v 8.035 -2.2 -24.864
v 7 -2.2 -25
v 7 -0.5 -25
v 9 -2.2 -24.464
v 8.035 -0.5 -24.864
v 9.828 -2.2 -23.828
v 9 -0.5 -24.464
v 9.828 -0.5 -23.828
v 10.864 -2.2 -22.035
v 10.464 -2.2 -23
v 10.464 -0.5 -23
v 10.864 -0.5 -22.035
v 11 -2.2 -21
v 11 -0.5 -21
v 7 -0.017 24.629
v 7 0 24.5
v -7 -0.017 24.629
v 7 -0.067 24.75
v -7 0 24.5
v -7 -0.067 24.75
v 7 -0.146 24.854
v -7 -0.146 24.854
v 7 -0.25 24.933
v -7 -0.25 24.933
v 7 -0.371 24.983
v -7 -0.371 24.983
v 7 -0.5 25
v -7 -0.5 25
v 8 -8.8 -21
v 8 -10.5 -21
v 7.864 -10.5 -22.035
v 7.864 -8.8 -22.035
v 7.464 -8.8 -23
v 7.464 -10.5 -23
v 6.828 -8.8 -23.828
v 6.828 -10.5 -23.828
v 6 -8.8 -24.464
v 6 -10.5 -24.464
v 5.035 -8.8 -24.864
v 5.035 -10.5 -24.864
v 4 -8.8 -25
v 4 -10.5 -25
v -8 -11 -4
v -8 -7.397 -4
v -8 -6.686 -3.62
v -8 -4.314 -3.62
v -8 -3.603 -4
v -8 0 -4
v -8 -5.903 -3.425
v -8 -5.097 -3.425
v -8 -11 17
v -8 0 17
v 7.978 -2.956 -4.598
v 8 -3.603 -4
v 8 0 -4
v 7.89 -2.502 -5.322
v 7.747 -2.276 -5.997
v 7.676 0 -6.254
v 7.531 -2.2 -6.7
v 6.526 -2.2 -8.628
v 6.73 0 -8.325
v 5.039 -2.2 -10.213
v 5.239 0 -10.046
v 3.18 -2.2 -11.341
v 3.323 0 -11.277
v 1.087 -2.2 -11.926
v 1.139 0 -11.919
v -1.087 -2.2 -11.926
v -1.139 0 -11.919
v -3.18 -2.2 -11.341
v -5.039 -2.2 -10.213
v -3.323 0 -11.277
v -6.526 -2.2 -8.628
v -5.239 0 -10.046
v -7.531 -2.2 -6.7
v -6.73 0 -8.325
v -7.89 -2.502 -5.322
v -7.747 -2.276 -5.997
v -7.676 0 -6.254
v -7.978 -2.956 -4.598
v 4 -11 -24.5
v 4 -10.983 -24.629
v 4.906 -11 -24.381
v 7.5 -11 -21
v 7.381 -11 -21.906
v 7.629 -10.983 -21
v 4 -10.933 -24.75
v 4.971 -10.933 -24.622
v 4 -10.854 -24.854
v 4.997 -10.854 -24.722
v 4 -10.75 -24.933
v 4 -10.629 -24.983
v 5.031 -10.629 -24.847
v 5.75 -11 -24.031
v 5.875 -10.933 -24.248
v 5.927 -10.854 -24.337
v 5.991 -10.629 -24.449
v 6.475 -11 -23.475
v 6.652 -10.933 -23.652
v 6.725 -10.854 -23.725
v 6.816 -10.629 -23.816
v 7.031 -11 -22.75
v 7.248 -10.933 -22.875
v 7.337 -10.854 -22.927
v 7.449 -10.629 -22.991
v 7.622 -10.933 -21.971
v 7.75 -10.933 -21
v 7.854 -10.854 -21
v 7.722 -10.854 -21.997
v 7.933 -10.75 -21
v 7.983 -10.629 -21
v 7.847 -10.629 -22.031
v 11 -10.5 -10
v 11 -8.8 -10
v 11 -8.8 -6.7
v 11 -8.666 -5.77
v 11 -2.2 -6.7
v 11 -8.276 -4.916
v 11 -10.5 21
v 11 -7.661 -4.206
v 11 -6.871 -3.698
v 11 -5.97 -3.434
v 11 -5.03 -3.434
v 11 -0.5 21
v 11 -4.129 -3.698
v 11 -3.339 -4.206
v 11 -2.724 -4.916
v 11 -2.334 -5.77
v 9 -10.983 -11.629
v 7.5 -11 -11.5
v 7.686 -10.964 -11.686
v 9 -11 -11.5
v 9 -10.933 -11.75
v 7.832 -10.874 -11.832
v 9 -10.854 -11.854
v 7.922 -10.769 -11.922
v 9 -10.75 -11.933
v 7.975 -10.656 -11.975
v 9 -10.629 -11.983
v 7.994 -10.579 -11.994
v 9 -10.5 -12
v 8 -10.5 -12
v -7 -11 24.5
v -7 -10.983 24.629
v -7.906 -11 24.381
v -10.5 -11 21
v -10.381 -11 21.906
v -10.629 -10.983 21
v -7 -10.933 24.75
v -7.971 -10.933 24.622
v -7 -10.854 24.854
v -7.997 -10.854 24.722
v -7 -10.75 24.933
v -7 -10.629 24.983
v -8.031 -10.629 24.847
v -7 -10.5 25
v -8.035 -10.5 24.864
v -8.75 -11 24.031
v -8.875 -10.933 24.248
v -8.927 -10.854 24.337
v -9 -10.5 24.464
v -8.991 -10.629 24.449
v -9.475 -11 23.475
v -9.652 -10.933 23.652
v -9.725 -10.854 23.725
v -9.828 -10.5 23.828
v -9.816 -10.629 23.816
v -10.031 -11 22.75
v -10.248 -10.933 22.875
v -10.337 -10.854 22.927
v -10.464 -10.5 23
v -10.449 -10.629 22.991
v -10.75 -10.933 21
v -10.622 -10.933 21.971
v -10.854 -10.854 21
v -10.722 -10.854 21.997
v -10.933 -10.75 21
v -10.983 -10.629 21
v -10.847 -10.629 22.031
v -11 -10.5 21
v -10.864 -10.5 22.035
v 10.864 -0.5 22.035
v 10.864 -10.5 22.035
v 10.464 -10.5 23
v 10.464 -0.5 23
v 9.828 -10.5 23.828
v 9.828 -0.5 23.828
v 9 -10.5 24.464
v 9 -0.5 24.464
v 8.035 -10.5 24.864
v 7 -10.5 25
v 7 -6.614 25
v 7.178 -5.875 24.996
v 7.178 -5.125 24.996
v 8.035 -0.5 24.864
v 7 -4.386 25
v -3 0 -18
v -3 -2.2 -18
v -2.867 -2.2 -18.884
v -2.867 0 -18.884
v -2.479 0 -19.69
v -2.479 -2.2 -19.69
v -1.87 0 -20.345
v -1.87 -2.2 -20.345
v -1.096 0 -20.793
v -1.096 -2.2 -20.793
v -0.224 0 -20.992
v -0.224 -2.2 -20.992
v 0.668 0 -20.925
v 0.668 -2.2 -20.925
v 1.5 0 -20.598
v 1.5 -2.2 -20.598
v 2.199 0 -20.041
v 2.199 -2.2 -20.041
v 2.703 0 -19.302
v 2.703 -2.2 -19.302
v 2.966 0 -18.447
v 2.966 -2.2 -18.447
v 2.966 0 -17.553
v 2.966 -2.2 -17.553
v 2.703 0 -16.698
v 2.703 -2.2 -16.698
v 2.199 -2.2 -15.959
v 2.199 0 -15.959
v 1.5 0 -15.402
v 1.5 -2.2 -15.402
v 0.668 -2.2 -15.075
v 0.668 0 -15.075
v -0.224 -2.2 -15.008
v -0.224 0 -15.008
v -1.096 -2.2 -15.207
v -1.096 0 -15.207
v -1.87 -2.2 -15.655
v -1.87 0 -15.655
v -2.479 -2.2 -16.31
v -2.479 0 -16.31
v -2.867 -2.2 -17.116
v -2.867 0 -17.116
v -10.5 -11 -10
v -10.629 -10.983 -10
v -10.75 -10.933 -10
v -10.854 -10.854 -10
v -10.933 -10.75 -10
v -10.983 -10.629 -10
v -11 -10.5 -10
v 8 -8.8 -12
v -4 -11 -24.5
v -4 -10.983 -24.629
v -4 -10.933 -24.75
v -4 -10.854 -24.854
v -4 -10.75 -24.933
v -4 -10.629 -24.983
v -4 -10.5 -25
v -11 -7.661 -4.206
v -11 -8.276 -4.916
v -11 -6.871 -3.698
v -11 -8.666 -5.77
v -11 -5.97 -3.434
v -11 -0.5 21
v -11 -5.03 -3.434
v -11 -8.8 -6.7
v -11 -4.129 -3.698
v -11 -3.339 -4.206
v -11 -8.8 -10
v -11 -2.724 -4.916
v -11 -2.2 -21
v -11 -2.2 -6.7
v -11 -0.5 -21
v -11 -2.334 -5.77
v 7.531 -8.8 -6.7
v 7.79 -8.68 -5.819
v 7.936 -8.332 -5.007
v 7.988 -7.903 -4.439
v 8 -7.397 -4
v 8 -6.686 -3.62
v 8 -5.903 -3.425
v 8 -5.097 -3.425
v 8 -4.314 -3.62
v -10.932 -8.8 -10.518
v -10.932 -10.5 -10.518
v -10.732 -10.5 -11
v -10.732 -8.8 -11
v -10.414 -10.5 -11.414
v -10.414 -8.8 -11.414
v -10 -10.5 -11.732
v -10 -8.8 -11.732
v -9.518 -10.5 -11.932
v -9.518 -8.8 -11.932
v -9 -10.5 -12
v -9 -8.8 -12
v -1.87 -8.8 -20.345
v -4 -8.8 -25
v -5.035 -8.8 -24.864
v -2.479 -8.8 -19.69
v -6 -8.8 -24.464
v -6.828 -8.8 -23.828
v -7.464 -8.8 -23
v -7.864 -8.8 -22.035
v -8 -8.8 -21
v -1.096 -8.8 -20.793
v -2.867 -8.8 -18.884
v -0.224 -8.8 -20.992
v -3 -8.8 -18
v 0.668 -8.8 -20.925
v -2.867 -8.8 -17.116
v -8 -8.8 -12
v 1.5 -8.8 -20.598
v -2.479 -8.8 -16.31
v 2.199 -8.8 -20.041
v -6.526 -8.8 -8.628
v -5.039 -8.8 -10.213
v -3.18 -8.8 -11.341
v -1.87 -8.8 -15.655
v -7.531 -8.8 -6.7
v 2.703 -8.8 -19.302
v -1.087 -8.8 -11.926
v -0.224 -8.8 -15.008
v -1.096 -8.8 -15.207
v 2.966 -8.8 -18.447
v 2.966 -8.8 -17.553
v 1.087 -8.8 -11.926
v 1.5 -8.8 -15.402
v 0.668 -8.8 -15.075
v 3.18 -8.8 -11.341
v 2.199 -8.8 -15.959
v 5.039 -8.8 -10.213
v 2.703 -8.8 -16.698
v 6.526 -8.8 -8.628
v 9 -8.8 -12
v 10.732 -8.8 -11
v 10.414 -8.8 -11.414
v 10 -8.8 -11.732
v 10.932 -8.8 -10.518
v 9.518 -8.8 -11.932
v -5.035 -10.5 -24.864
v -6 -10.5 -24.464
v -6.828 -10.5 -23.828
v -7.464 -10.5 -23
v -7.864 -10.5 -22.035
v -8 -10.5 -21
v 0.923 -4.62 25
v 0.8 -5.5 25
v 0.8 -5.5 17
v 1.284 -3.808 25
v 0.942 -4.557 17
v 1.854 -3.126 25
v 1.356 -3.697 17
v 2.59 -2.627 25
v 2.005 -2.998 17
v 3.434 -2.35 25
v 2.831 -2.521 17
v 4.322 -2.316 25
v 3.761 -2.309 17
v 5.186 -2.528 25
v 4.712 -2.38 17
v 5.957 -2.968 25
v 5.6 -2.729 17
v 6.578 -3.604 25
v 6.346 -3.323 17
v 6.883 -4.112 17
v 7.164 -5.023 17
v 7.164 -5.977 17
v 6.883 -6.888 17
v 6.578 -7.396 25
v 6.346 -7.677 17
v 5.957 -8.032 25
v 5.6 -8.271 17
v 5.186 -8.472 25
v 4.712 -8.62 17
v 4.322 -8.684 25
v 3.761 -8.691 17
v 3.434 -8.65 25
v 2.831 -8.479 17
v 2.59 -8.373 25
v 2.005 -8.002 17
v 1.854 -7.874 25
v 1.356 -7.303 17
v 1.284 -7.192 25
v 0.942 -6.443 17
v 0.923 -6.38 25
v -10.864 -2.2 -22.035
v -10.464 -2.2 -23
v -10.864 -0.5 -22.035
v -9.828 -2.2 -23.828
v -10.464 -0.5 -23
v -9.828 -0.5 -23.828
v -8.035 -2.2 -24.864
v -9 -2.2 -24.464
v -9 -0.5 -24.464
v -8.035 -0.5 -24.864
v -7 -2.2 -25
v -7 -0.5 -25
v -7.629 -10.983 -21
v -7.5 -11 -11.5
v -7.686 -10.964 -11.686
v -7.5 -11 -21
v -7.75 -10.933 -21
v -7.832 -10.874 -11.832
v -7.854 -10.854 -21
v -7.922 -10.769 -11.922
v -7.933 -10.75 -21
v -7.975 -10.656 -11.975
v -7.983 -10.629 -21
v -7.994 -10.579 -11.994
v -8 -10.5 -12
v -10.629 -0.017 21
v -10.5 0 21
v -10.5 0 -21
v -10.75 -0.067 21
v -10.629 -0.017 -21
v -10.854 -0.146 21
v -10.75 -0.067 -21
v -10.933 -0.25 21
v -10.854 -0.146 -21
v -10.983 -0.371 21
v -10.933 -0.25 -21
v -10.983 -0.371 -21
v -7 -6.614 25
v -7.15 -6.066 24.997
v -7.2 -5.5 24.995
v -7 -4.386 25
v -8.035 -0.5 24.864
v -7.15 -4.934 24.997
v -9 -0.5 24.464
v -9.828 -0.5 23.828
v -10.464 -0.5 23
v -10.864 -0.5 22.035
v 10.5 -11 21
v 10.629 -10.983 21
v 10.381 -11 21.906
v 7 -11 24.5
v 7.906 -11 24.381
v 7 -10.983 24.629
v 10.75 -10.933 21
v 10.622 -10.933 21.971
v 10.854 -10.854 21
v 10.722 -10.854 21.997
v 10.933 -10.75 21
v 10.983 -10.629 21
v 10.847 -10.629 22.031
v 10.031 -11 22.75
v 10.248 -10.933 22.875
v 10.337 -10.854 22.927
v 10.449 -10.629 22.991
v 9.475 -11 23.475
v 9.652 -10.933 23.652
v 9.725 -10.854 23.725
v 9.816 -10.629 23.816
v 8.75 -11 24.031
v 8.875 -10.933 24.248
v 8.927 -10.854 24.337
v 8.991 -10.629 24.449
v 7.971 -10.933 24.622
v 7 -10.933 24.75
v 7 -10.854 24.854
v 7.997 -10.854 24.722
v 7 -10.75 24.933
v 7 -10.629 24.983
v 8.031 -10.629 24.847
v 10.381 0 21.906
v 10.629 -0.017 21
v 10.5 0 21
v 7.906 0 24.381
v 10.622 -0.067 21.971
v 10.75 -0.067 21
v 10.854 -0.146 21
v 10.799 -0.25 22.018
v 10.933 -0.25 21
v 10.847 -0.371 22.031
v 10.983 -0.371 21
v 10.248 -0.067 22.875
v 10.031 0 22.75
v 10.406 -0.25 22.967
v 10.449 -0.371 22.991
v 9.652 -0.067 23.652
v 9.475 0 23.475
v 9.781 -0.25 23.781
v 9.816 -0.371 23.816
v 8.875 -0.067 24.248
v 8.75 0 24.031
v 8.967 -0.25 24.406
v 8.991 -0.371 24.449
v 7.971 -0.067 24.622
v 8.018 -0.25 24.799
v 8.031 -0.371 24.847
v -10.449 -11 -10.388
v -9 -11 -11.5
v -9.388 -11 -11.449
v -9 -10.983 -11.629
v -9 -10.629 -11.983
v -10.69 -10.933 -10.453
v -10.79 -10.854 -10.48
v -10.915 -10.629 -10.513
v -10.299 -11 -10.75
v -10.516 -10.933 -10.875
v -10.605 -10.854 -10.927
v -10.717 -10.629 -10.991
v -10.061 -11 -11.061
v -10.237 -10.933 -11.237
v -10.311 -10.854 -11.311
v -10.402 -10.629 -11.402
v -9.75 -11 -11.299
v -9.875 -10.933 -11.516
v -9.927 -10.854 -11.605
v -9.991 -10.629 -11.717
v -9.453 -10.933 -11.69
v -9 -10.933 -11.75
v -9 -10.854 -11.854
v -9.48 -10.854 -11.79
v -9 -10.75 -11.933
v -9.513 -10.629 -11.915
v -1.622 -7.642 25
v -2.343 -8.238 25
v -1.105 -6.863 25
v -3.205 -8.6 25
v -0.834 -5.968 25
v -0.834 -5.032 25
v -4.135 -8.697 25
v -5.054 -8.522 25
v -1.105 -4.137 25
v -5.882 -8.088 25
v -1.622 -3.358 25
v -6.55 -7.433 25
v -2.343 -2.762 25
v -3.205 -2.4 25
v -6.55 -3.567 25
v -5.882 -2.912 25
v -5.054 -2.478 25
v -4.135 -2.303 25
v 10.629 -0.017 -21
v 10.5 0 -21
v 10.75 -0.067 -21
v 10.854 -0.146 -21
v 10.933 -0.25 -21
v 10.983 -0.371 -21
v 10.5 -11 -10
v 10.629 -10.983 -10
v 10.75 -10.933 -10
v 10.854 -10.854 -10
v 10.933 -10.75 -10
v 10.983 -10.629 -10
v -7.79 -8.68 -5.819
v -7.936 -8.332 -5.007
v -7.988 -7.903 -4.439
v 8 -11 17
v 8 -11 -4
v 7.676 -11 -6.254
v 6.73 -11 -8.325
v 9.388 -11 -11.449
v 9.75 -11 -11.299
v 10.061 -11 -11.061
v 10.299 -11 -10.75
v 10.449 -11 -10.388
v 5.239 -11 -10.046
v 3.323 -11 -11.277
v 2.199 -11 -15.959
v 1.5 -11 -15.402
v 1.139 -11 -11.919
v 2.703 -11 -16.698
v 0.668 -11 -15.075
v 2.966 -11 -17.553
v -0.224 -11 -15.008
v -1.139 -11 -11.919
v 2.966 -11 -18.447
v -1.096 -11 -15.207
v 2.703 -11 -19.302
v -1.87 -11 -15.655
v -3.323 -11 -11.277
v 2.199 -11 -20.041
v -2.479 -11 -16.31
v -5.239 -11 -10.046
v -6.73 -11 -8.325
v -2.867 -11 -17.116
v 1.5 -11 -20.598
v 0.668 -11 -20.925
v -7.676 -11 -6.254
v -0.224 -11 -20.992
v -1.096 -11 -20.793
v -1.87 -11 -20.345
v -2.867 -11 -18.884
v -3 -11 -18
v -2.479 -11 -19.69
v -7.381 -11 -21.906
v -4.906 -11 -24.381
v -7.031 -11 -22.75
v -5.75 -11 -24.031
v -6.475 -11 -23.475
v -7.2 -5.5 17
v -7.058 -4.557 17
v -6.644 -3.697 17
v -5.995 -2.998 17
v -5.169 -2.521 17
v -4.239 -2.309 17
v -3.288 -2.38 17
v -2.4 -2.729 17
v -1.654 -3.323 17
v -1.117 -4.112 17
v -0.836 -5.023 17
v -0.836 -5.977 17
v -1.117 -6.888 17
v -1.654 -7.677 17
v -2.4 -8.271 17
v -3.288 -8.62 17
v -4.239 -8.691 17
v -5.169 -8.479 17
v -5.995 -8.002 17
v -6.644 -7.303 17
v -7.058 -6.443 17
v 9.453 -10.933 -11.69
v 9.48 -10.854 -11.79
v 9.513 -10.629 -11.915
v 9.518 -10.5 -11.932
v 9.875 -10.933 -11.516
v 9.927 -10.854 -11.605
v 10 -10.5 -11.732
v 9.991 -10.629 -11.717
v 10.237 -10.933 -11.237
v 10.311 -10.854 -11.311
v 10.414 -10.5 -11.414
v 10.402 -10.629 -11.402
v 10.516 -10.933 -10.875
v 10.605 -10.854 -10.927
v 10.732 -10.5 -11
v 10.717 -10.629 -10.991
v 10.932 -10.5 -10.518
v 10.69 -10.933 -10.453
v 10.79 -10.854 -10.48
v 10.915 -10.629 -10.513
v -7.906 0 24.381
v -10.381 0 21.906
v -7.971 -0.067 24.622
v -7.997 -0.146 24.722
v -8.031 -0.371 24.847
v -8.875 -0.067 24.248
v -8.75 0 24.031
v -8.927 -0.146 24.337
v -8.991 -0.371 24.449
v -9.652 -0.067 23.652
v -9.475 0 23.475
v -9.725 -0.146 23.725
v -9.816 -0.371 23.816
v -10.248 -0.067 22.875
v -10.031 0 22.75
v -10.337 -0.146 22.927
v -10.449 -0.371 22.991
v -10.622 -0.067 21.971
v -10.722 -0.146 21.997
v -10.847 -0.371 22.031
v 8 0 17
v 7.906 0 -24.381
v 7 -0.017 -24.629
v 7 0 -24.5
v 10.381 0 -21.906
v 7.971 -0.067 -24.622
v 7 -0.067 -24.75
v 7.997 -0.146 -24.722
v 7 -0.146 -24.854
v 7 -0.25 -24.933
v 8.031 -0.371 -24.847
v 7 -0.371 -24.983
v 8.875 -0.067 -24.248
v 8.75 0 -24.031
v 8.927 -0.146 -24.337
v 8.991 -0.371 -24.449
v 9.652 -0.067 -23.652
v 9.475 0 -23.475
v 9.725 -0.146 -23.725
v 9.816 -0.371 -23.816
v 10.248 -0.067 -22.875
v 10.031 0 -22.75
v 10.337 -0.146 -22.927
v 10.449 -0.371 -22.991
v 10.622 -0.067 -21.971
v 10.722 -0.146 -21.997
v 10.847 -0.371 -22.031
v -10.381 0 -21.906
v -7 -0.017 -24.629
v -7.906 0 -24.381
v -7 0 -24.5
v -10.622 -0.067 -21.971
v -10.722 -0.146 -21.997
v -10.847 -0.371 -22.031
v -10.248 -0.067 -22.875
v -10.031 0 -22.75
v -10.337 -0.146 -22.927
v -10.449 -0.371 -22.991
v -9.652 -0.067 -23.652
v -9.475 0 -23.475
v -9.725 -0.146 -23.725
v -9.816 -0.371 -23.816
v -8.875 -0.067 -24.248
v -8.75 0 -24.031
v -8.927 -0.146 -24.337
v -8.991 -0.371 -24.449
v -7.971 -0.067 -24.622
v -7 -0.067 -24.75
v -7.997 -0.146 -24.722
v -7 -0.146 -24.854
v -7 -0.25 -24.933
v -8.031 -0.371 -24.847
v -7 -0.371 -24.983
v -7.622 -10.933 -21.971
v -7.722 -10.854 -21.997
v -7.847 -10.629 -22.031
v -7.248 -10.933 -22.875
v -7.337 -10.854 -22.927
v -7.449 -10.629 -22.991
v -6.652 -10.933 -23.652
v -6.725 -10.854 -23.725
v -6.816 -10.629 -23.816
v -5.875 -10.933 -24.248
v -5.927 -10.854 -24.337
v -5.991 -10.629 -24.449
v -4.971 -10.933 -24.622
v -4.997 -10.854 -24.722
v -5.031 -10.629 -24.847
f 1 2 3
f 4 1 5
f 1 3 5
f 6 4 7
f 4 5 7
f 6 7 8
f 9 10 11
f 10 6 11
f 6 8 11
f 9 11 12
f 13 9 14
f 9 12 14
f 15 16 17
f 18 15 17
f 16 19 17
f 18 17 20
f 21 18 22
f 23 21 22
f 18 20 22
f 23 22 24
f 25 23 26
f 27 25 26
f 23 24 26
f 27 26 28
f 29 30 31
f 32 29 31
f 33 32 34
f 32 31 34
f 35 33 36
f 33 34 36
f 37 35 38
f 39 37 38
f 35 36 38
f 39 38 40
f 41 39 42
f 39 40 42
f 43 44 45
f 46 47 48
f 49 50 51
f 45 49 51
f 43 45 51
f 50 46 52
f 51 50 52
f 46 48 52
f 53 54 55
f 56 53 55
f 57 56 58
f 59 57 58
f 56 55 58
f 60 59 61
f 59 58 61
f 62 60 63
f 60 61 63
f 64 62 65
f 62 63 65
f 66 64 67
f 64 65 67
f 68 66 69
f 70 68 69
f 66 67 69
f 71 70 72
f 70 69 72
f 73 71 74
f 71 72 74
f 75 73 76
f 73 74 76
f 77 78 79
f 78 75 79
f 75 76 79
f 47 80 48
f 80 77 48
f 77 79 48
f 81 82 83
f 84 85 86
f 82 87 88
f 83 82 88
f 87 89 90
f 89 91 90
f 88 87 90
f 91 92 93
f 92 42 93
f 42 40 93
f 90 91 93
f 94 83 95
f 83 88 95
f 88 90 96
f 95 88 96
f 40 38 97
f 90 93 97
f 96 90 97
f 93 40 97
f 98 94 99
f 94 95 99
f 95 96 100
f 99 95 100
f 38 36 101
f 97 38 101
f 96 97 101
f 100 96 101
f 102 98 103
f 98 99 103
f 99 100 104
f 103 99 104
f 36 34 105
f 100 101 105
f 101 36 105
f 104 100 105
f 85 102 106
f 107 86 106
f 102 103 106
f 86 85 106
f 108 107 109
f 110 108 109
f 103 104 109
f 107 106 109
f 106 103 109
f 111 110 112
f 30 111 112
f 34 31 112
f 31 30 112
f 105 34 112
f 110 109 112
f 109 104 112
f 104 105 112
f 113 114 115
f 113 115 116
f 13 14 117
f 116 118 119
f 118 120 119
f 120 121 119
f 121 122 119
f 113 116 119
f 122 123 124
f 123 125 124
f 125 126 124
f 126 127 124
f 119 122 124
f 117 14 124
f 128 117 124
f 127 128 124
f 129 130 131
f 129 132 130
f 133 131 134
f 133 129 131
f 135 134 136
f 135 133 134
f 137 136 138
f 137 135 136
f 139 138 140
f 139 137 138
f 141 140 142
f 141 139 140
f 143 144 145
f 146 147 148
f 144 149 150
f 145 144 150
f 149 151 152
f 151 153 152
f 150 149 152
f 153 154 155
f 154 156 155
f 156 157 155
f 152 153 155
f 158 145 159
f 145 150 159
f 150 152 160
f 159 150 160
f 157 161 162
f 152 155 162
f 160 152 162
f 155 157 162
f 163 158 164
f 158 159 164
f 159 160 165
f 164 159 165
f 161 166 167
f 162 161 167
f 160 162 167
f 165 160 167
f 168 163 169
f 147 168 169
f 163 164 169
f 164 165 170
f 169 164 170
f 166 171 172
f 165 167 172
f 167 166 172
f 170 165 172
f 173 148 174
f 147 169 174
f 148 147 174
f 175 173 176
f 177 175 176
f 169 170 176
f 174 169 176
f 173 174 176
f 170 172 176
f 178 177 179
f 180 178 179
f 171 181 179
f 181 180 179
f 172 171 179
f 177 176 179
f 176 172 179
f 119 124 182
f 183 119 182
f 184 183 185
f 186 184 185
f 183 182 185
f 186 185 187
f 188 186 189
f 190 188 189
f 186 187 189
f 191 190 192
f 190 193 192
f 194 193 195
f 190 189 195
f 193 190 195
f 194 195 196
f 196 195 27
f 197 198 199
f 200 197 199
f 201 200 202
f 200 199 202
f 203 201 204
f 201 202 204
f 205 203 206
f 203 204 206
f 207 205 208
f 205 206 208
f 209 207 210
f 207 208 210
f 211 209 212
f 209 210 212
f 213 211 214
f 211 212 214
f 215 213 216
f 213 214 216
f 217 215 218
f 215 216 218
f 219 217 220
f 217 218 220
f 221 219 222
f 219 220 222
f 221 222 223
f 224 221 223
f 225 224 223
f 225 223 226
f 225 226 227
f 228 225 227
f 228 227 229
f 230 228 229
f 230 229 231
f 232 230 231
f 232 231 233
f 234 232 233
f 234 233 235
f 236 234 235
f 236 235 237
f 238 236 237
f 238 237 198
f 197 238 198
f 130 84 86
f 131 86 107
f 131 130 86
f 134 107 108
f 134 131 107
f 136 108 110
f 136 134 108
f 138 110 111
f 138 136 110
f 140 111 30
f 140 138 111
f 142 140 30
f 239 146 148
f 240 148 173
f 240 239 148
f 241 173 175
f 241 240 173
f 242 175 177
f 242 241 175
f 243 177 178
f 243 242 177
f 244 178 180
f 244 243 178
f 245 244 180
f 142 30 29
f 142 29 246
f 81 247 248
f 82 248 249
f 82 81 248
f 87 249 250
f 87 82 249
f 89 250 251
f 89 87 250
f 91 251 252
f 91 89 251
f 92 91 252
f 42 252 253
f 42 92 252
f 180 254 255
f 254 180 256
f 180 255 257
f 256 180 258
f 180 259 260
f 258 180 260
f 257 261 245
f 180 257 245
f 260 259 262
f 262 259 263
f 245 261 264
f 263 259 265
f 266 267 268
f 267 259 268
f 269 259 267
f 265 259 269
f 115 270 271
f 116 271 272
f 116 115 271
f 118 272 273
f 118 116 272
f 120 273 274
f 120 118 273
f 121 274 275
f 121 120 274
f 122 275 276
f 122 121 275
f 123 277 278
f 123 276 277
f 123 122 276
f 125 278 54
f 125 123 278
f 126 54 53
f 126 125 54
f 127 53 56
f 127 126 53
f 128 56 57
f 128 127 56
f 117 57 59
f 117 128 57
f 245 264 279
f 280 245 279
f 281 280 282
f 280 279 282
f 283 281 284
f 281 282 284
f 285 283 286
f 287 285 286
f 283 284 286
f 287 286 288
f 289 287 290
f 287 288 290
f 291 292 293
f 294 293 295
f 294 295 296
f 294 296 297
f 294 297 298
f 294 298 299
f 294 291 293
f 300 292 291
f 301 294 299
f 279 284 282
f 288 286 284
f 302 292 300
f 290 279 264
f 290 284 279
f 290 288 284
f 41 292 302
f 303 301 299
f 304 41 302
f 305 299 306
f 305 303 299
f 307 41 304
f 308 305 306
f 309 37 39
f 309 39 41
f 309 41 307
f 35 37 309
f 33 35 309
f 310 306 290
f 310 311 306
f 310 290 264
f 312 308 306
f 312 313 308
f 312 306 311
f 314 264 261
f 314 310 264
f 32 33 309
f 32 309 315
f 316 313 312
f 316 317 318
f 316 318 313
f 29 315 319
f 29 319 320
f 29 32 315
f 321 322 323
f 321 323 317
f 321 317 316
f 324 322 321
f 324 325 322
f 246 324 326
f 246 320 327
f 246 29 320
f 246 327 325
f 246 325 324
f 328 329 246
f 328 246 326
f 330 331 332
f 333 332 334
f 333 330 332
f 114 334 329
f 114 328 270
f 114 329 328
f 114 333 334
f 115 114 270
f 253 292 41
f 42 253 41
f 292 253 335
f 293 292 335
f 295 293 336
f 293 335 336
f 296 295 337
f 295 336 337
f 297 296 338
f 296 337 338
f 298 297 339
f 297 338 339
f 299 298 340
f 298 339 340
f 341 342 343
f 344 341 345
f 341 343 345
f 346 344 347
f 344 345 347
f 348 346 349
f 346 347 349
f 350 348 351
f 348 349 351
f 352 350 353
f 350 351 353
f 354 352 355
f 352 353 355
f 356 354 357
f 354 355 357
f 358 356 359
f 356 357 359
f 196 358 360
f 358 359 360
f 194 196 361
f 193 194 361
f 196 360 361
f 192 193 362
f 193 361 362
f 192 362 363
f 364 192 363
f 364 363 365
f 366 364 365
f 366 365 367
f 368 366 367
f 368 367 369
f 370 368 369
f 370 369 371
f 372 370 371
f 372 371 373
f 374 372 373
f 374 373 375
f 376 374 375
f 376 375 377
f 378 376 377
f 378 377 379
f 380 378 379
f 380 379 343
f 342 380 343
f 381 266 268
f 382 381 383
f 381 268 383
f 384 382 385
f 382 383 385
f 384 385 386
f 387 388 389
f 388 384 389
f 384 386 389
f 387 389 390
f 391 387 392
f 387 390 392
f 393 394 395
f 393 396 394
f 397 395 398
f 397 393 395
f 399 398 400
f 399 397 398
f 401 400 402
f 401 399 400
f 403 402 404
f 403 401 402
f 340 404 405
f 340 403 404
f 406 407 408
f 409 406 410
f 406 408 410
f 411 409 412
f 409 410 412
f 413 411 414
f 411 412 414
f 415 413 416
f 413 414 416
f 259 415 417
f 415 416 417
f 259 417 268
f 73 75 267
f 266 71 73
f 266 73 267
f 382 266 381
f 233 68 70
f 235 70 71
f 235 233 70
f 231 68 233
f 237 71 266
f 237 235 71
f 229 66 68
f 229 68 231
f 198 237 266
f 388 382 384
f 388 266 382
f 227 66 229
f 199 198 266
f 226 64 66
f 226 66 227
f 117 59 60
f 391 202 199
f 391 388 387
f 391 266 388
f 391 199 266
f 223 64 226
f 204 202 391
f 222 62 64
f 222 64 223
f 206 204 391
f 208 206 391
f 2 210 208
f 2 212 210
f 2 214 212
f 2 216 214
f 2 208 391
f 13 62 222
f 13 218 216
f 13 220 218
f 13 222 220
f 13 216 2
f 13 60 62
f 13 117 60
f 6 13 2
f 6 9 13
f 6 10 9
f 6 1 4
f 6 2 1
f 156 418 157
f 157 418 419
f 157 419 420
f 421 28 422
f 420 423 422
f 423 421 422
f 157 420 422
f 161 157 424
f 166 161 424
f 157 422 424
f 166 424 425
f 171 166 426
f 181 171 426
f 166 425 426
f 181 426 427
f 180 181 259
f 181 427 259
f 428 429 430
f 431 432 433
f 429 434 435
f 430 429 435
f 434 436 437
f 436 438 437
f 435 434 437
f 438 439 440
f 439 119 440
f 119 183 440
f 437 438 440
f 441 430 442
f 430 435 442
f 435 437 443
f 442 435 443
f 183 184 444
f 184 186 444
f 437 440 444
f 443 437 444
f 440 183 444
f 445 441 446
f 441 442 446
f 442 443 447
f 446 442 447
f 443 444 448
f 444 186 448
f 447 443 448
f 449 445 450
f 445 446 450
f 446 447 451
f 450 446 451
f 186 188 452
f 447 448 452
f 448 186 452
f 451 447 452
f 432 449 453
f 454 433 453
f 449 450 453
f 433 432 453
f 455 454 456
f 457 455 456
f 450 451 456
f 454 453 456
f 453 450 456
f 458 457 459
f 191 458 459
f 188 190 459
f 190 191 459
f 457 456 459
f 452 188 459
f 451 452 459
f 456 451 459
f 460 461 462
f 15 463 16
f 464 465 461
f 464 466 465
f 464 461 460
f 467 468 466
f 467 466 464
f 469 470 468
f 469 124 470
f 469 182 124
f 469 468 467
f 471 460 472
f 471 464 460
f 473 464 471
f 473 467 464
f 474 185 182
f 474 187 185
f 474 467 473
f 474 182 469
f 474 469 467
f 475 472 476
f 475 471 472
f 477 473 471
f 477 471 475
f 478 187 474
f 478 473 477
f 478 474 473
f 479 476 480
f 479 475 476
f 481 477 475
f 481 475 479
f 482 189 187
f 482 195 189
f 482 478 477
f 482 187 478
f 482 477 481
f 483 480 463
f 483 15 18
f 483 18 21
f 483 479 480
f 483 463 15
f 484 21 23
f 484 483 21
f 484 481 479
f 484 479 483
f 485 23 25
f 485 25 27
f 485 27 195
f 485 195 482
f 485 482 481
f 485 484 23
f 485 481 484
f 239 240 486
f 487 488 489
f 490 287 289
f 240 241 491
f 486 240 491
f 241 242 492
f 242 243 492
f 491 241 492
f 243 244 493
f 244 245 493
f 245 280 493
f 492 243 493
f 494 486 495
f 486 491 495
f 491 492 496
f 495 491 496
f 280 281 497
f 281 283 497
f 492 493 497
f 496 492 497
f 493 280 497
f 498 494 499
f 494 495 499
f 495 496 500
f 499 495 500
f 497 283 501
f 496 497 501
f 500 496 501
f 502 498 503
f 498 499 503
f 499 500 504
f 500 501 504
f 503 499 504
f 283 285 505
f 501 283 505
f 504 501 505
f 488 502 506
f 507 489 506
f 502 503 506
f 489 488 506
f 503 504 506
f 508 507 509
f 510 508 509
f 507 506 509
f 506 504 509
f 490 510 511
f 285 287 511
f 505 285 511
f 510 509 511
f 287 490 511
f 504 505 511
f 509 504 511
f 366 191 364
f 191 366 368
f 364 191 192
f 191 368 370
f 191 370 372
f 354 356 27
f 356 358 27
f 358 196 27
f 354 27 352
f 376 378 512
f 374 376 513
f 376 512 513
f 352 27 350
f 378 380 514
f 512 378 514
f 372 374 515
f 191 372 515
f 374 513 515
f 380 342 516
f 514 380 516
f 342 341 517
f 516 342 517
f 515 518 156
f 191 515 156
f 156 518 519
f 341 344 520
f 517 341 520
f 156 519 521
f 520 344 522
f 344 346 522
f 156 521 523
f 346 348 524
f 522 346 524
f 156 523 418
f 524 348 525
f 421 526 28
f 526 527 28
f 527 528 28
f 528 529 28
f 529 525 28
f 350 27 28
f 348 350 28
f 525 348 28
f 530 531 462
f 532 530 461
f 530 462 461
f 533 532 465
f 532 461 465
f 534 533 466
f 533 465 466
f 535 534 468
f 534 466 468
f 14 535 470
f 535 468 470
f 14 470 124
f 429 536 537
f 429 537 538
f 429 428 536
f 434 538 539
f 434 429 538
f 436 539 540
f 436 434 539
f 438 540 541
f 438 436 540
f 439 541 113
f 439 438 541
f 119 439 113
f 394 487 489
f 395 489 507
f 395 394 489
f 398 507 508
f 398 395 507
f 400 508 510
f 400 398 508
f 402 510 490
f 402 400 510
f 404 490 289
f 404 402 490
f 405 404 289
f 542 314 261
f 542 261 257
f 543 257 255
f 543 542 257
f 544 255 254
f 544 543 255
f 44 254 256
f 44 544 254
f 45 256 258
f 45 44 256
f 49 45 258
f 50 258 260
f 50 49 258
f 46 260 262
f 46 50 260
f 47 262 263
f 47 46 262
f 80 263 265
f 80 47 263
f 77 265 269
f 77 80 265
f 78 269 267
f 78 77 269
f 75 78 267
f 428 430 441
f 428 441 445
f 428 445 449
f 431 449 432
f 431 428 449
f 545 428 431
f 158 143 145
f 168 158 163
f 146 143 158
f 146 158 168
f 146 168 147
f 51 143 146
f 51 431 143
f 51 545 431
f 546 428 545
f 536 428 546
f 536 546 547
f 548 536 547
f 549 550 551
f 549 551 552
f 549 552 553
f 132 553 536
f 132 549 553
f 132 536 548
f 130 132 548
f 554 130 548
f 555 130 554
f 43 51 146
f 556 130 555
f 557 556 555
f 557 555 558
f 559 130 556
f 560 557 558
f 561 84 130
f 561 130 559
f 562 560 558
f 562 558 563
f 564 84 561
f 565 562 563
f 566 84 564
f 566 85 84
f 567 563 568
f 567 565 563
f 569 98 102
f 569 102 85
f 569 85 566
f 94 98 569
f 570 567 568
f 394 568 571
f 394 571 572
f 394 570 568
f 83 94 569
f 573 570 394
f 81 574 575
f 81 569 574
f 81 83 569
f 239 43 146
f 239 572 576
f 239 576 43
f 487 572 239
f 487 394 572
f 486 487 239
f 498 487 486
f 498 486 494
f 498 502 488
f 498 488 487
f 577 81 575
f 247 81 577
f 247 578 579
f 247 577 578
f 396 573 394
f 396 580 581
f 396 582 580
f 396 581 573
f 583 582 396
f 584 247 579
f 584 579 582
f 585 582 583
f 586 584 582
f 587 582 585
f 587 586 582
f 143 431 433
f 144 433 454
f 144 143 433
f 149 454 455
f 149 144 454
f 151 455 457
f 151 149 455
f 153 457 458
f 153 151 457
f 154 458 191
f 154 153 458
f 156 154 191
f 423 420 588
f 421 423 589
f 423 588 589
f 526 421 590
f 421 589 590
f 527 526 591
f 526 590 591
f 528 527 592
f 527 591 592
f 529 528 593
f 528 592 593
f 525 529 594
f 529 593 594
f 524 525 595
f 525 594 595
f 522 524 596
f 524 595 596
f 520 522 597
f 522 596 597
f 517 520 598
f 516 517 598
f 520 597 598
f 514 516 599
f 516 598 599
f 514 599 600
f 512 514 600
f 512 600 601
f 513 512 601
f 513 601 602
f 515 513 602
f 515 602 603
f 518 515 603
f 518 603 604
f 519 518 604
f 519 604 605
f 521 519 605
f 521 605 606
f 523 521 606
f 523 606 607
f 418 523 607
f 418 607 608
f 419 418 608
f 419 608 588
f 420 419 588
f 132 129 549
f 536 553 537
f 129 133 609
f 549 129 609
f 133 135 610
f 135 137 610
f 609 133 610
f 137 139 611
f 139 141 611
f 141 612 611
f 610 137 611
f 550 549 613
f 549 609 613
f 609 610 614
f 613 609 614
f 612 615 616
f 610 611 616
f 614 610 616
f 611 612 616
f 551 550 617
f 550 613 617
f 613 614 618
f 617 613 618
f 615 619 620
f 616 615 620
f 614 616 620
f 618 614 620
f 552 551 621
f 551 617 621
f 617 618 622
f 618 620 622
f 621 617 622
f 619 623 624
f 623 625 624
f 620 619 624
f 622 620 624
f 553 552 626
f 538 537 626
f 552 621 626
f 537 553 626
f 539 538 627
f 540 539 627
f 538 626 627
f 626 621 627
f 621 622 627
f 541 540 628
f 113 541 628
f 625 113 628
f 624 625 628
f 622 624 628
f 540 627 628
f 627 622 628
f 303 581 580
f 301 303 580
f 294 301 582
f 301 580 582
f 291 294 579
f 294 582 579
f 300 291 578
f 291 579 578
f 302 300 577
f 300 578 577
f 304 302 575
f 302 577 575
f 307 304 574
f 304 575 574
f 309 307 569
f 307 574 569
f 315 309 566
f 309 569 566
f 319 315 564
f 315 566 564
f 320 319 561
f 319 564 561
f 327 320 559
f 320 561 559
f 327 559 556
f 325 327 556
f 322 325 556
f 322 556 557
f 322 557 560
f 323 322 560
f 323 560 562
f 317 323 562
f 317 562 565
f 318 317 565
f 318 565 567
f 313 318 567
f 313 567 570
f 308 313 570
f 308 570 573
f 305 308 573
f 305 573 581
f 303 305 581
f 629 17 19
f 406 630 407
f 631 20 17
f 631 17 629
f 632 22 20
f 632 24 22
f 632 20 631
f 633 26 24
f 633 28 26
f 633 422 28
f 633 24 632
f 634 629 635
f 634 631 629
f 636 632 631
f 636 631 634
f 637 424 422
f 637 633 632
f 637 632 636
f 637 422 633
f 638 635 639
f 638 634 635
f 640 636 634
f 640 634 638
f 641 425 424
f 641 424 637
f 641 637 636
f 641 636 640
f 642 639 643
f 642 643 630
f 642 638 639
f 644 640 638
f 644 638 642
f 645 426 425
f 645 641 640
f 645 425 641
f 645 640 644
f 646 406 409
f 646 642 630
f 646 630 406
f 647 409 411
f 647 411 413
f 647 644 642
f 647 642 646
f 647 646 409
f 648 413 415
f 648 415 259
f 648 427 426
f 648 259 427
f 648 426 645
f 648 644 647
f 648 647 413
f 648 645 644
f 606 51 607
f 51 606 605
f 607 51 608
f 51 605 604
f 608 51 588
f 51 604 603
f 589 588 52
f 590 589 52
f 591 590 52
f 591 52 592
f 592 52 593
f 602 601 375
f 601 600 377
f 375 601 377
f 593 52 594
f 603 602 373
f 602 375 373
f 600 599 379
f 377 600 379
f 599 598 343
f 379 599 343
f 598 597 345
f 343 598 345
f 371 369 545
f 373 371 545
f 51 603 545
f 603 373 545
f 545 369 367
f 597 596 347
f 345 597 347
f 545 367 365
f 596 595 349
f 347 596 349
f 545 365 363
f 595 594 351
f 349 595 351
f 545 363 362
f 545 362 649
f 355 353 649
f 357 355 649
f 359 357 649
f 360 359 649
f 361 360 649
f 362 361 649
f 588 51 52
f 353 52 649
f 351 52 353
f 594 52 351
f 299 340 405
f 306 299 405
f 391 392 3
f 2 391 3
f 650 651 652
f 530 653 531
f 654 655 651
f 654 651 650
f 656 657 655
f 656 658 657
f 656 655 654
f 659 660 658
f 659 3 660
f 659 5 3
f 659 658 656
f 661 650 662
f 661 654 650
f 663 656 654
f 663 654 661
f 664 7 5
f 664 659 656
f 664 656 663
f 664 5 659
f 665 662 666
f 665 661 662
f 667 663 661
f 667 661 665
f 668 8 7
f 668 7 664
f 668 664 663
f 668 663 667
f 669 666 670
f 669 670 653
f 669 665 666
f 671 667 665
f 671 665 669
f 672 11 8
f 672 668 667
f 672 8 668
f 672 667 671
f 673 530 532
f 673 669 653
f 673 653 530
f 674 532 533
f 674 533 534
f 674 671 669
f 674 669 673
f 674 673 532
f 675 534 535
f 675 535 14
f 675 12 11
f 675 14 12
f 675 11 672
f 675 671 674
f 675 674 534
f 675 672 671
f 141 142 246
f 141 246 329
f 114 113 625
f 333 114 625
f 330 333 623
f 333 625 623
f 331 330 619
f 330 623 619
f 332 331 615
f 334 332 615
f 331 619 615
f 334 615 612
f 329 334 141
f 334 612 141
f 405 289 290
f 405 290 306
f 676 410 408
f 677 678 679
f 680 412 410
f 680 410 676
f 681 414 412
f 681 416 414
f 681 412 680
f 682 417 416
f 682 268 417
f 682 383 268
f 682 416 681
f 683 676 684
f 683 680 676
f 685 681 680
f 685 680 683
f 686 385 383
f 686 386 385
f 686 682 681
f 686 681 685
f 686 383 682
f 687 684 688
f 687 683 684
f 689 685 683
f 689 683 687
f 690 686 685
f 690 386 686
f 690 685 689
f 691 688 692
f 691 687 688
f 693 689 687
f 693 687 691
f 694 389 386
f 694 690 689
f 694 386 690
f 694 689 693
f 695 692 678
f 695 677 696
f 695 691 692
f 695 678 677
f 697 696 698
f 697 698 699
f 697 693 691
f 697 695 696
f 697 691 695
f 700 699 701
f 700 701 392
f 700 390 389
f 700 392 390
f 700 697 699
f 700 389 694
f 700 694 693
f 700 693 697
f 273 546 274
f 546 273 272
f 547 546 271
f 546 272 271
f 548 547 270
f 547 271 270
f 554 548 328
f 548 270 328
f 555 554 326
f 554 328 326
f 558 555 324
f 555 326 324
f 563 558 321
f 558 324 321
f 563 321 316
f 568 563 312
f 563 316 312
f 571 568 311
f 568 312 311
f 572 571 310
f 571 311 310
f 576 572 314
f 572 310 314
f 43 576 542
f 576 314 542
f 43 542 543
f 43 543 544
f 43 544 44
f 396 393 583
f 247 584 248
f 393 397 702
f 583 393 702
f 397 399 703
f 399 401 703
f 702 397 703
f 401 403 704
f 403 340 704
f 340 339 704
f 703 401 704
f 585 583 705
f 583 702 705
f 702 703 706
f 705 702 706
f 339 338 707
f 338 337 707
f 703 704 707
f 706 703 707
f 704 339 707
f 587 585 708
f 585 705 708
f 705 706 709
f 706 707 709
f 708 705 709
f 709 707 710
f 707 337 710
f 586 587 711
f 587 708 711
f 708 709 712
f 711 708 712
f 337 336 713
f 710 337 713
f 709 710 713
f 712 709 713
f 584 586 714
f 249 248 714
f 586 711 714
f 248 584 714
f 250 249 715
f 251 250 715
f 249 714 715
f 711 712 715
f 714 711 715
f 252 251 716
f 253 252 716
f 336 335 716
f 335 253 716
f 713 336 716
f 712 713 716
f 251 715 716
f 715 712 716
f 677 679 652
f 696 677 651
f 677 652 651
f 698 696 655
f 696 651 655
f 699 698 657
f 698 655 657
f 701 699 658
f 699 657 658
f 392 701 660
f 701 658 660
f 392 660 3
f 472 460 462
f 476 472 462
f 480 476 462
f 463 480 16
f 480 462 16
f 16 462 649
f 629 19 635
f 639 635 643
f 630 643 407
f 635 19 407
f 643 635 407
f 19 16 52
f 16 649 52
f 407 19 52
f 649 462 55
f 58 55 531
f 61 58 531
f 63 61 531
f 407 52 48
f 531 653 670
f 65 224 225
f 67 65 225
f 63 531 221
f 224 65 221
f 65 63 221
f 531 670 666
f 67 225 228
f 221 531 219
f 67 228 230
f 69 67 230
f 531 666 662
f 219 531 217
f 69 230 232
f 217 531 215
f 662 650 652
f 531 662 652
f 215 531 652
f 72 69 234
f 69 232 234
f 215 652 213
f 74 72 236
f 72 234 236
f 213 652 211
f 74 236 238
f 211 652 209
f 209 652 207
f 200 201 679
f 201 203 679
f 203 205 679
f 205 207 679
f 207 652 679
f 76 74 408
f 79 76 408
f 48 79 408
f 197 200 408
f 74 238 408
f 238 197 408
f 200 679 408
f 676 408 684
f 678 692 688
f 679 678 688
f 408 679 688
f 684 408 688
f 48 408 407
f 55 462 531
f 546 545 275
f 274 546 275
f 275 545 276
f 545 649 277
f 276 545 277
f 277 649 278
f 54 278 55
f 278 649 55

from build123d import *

# Parameters (mm, degrees)
SALIENTE_EXTRUIR1_DEPTH         = 11
DI_METRO_DE_TALADRO_6_0_6_1_D   = 6
CORTAR_EXTRUIR1_DEPTH           = 36.071355834
CROQUIS6_W                      = 4.933877459
CROQUIS6_H                      = 16.455327893
CROQUIS6_W_2                    = 4.832675104
CORTAR_EXTRUIR5_DEPTH           = 4
REDONDEO1_R                     = 4
REDONDEO2_R                     = 4
REDONDEO3_R                     = 2
REDONDEO4_R                     = 0.5
DI_METRO_DE_TALADRO_6_4_6_4_1_D = 6.4


with BuildPart() as part:
    # Croquis1 → Saliente-Extruir1 (new body)
    with BuildSketch(Plane(origin=(0, 0, 0), x_dir=(1, 0, 0), z_dir=(0, 1, 0))):
        with BuildLine():
            Line((-7, 25), (7, 25))
            ThreePointArc((7, 25), (9.828427125, 23.828427125), (11, 21))
            Line((11, 21), (11, -21))
            ThreePointArc((11, -21), (9.828427125, -23.828427125), (7, -25))
            Line((7, -25), (-7, -25))
            ThreePointArc((-7, -25), (-9.828427125, -23.828427125), (-11, -21))
            Line((-11, -21), (-11, 21))
            ThreePointArc((-11, 21), (-9.828427125, 23.828427125), (-7, 25))
        make_face()
        with BuildLine():
            Line((-8, -17), (8, -17))
            Line((8, -17), (8, 4))
            ThreePointArc((8, 4), (0, 12), (-8, 4))
            Line((-8, 4), (-8, -17))
        make_face(mode=Mode.SUBTRACT)
    extrude(amount=-SALIENTE_EXTRUIR1_DEPTH)

    # Diámetro de taladro Ø6.0 (6)1 (through all)
    with Locations(Plane(origin=(0, 0, 0), x_dir=(1, 0, 0), z_dir=(0, 1, 0))):
        with Locations((0, 18)):
            Hole(DI_METRO_DE_TALADRO_6_0_6_1_D / 2)

    # Croquis5 → Cortar-Extruir1 (cut, through all)
    with BuildSketch(Plane(origin=(11, 0, 0), x_dir=(0, 0, -1), z_dir=(1, 0, 0))):
        with BuildLine():
            Line((6.7, -2.2), (26.063321608, -2.2))
            Line((26.063321608, -2.2), (26.063321608, -8.8))
            Line((26.063321608, -8.8), (6.7, -8.8))
            ThreePointArc((6.7, -8.8), (3.4, -5.5), (6.7, -2.2))
        make_face()
    extrude(amount=-CORTAR_EXTRUIR1_DEPTH, mode=Mode.SUBTRACT)

    # Croquis6 → Cortar-Extruir5 (cut)
    with BuildSketch(Plane.XZ.offset(11)):
        with Locations((10.46693873, -20.227663947)):
            Rectangle(CROQUIS6_W, CROQUIS6_H)
        with Locations((-10.416337552, -20.227663947)):
            Rectangle(CROQUIS6_W_2, CROQUIS6_H)
    extrude(amount=-CORTAR_EXTRUIR5_DEPTH, mode=Mode.SUBTRACT)

    # Redondeo1
    # the kernel refuses this fillet: 4 mm, written as the material it takes off along each edge
    with BuildSketch(Plane(origin=(8, -21.005040364, -24.872983346), x_dir=(-0.9994962175029386, 0, -0.031738166256391975), z_dir=(0, 1, 0))) as redondeo1_piece_1:
        with BuildLine():
            CenterArc((3.875063481, 3.99798487), REDONDEO1_R, 181.818768407, 90)
            Line((-0.122921389, 3.871032205), (-0.522719876, 3.858336938))
            Line((-0.522719876, 3.858336938), (-0.399798487, -0.012695267))
            Line((-0.399798487, -0.012695267), (-0.087657483, -0.390277037))
            ThreePointArc((-0.087657483, -0.390277037), (1.01622276, -0.495012986), (4.014711412, -0.399798487))
            Line((4.014711412, -0.399798487), (4.002016146, 0))
        make_face()
    extrude(amount=12.205040364, mode=Mode.SUBTRACT)

    # Redondeo2
    # the kernel refuses this fillet: 4 mm, written as the material it takes off along each edge
    with BuildSketch(Plane(origin=(-8, -21.005040364, -24.872983346), x_dir=(0, 0, 1), z_dir=(0, 1, 0))) as redondeo2_piece_1:
        with BuildLine():
            CenterArc((3.872983346, 4), REDONDEO2_R, 180, 90)
            Line((-0.127016654, 4), (-0.527016654, 4))
            ThreePointArc((-0.527016654, 4), (-0.527016654, 1), (-0.387298335, -0.1))
            Line((-0.387298335, -0.1), (0, -0.4))
            Line((0, -0.4), (3.872983346, -0.4))
            Line((3.872983346, -0.4), (3.872983346, 0))
        make_face()
    extrude(amount=12.205040364, mode=Mode.SUBTRACT)

    # Redondeo3
    redondeo3_edges = [part.edges().sort_by_distance(p)[0] for p in [
        (-11, -9.9, -12),
        (11, -9.9, -12),
    ]]
    fillet(redondeo3_edges, radius=REDONDEO3_R)

    # Redondeo4
    redondeo4_edges = [part.edges().sort_by_distance(p)[0] for p in [
        (9.828427125, -11, 23.828427125),
        (0, 0, 25),
        (-9.828427125, 0, 23.828427125),
        (-8.5, -11, -12),
        (0, -11, -25),
        (6.828427125, -11, -23.828427125),
        (-8, -11, -16.5),
        (11, -11, 5.5),
        (-6.828427125, -11, -23.828427125),
        (-11, -11, 5.5),
        (8.5, -11, -12),
        (10.414213562, -11, -11.414213562),
        (-10.414213562, -11, -11.414213562),
        (-9.828427125, -11, 23.828427125),
        (0, -11, 25),
        (-11, 0, 0),
        (-9.828427125, 0, -23.828427125),
        (0, 0, -25),
        (8, -11, -16.5),
        (9.828427125, 0, -23.828427125),
        (11, 0, 0),
        (9.828427125, 0, 23.828427125),
    ]]
    fillet(redondeo4_edges, radius=REDONDEO4_R)

    # Diámetro de taladro Ø6.4 (6.4)1 (through all)
    with Locations(Plane.XY.offset(25)):
        with Locations((-4, -5.5), (4, -5.5)):
            Hole(DI_METRO_DE_TALADRO_6_4_6_4_1_D / 2)


solid = part.part
